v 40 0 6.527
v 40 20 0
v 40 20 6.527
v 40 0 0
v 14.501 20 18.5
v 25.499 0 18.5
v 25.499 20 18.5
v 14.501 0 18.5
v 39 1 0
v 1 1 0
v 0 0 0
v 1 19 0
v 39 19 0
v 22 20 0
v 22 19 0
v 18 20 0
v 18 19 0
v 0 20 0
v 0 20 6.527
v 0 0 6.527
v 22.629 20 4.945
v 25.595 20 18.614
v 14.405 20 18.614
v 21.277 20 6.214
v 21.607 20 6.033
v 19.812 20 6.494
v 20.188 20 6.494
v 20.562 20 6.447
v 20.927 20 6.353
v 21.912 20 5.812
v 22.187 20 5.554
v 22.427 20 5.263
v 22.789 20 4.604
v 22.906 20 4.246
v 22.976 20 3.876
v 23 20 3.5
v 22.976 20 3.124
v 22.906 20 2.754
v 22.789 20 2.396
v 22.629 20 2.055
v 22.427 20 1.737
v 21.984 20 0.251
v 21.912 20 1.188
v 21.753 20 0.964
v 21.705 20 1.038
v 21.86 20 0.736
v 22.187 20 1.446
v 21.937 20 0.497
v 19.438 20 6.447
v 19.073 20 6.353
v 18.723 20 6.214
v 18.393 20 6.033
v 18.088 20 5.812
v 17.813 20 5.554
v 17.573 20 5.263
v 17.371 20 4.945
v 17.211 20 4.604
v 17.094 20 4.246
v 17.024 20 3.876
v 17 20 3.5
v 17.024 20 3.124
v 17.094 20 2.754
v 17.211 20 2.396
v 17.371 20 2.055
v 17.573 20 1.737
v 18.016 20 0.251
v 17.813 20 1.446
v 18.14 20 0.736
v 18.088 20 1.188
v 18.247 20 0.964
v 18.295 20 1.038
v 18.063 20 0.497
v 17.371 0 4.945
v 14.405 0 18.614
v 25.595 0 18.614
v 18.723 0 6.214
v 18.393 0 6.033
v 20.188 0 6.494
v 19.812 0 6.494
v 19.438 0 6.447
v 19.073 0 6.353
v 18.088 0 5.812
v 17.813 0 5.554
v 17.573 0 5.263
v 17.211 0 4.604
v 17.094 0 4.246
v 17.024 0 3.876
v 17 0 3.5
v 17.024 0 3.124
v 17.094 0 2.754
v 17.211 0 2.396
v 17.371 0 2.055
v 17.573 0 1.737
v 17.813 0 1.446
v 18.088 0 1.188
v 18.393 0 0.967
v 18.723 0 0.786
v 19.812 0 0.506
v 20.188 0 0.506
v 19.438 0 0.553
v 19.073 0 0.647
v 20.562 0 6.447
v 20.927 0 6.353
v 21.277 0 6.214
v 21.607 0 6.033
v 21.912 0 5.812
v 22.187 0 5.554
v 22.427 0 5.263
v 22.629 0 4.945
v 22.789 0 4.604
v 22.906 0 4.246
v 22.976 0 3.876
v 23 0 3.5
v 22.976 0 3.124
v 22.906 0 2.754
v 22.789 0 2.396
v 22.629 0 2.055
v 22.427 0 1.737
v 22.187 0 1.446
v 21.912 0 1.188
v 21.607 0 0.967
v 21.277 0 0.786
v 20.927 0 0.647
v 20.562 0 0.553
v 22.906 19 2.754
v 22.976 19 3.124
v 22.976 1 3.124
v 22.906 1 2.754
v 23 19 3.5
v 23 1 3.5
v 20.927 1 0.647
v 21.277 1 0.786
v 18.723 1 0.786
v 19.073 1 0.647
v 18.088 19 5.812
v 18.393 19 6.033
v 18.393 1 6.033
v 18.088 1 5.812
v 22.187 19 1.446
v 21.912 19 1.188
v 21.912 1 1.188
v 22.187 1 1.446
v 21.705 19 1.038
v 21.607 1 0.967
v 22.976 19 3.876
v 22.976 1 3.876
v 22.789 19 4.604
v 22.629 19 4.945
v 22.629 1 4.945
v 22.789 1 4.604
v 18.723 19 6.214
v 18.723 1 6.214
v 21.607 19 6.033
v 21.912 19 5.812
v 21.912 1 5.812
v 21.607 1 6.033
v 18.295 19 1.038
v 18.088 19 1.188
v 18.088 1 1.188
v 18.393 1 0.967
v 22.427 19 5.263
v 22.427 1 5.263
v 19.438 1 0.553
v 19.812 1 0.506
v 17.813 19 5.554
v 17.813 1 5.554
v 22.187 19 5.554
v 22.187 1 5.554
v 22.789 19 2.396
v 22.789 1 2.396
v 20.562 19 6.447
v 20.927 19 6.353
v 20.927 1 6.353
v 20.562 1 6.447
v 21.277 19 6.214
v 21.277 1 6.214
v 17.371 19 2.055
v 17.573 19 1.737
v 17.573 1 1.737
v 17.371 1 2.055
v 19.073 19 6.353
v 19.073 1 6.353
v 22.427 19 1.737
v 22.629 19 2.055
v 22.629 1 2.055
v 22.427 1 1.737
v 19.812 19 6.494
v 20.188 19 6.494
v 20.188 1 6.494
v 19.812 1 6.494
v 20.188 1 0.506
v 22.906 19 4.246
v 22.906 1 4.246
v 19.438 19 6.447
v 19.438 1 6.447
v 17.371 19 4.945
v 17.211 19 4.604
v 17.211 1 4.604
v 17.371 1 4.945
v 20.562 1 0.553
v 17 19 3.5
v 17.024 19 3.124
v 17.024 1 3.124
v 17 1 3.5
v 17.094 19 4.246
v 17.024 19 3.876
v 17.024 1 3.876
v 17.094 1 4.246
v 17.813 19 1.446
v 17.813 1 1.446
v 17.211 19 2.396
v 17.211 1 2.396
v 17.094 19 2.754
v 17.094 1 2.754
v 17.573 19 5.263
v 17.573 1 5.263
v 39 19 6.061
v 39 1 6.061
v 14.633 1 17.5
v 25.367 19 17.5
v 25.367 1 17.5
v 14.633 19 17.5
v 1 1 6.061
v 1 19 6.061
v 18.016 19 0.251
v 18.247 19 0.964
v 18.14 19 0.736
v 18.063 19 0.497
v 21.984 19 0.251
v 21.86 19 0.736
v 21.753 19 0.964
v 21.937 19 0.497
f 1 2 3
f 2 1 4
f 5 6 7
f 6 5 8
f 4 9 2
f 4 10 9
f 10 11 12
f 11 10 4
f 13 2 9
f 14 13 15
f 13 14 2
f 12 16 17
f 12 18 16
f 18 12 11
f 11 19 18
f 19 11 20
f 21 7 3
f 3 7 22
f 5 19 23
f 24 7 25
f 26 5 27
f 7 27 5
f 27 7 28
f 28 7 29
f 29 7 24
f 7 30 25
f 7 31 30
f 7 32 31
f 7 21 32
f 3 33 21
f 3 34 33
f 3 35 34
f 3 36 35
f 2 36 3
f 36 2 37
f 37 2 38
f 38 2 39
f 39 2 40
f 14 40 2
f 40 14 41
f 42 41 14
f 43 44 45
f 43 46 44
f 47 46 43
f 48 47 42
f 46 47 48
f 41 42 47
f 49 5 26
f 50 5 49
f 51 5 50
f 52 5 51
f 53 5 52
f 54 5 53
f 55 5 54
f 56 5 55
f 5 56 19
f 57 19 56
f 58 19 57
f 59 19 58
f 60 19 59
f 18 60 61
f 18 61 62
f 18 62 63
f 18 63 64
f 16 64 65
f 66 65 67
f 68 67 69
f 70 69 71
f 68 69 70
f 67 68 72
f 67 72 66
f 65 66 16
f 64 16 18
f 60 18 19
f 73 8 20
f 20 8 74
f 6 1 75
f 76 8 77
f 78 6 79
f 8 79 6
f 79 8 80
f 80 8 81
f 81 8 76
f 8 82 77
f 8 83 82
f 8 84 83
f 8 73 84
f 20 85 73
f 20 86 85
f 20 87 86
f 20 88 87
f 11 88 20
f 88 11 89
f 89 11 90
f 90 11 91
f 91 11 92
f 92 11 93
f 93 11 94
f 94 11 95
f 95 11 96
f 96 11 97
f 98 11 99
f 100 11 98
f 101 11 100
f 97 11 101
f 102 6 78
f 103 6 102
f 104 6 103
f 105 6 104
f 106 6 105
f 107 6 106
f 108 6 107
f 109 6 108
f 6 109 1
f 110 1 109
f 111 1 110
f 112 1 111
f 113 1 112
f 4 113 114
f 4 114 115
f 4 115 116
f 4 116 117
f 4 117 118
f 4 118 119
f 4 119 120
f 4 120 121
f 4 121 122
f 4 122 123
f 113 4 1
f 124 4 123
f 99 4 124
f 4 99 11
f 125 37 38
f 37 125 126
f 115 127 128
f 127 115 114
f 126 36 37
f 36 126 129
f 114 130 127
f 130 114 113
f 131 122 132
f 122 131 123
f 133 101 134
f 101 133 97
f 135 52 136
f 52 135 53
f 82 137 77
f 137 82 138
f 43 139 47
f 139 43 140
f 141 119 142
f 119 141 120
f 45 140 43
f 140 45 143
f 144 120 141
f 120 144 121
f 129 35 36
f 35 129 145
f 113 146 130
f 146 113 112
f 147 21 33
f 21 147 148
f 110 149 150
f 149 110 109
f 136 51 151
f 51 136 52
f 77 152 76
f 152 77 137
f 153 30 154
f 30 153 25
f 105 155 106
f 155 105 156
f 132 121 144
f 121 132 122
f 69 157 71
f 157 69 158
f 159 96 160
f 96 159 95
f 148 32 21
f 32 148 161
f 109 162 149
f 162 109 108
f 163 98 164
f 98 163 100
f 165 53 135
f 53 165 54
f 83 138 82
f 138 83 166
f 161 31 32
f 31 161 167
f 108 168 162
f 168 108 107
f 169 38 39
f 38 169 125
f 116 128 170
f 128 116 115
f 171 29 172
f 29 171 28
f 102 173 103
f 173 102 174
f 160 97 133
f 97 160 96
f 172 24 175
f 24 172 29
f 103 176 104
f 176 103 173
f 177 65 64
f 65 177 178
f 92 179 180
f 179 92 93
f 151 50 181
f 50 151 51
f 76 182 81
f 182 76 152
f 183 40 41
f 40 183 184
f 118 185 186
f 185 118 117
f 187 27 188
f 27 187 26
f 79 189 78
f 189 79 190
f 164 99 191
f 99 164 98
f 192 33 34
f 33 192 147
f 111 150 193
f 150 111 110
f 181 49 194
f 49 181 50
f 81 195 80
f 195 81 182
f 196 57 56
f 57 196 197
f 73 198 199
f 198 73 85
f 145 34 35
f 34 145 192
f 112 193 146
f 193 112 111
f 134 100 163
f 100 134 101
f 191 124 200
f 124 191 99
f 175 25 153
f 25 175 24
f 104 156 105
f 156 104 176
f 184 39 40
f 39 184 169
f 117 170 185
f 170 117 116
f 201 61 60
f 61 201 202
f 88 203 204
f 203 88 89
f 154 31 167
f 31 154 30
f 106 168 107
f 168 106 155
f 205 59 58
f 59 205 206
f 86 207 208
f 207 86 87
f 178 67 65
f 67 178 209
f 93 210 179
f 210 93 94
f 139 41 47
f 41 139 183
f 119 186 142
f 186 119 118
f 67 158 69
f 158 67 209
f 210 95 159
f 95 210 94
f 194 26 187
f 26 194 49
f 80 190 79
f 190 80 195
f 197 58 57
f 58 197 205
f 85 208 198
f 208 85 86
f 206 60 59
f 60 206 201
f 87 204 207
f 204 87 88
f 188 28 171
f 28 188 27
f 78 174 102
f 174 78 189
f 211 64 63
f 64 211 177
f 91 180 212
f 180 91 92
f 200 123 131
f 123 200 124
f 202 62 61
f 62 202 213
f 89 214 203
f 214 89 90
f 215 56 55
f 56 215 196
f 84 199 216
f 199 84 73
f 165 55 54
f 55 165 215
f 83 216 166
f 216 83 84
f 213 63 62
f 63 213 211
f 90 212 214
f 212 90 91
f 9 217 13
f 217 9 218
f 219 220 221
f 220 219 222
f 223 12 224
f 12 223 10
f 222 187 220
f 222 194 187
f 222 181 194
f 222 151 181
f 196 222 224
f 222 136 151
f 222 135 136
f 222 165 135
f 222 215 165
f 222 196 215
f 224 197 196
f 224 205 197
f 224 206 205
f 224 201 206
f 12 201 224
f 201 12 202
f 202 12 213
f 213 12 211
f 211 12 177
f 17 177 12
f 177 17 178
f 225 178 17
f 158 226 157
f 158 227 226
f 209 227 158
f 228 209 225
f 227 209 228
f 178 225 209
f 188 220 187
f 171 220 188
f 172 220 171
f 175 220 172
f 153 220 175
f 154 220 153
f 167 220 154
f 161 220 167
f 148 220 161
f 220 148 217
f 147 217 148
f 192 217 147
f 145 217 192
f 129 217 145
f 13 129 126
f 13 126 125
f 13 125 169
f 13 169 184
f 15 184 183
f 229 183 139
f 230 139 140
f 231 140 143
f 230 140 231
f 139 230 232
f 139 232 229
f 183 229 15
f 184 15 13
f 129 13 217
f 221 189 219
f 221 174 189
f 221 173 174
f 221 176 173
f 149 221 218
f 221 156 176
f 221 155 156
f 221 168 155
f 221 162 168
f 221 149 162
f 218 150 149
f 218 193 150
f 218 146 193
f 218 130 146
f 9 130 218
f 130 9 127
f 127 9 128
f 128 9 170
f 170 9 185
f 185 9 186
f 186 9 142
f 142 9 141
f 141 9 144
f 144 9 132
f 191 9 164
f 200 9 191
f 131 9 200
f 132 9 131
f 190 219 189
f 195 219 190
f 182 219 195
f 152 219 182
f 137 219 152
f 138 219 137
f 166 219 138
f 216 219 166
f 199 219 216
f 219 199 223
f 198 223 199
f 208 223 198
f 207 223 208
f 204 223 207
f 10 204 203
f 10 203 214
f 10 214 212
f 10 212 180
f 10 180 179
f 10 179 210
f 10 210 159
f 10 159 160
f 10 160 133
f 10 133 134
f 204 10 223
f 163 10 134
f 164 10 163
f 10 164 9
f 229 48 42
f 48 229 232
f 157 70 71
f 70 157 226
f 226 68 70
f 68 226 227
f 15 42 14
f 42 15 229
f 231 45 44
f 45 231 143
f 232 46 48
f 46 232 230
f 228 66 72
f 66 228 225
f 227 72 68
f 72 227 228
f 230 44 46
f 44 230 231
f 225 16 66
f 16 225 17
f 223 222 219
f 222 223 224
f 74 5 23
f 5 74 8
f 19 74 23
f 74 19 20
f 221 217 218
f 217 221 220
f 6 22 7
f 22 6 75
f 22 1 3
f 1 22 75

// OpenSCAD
difference(){
    cube([40, 20, 18.5]);
    
    //Aussparung für die Achse
    translate([20, -.5, 3.5]){
        rotate([270, 0, 0]){
            cylinder(h = 38, r1 = 3, r2 = 3, center = false, $fn = 50);
        }
    }
    translate([1, 1, -0.5]){
        cube([38, 18, 18]);
    }   
   translate([20, 18, 0]){
       rotate([270, 0, 0]){
            cylinder(3, 2, 2, $fn = 50);
       }
   }
   
   rotate([0, 50, 0]){
        translate([-25, -0.5, 0]){
            cube([20, 22, 30]);
        }
   }
   
   translate([40, 0, 0]){
        mirror([1, 0, 0]){
            rotate([0, 50, 0]){
                translate([-25, -0.5, 0]){
                    cube([20, 22, 30]);
                }
            }
   
        }
    }

 
}


difference(){
    rotate([0, 50, 0]){
        translate([-5, 0, 0]){
            cube([1, 20, 23]);
        }
    }
    translate([-20, -0.5, 0]){
        cube([20, 22, 20]);
    }
}

translate([40, 0, 0]){
    mirror(){
        difference(){
            rotate([0, 50, 0]){
                translate([-5, 0, 0]){
                    cube([1, 20, 23]);
                }
            }
            translate([-20, -0.5, 0]){
                cube([20, 22, 20]);
            }
        }
    }
}
